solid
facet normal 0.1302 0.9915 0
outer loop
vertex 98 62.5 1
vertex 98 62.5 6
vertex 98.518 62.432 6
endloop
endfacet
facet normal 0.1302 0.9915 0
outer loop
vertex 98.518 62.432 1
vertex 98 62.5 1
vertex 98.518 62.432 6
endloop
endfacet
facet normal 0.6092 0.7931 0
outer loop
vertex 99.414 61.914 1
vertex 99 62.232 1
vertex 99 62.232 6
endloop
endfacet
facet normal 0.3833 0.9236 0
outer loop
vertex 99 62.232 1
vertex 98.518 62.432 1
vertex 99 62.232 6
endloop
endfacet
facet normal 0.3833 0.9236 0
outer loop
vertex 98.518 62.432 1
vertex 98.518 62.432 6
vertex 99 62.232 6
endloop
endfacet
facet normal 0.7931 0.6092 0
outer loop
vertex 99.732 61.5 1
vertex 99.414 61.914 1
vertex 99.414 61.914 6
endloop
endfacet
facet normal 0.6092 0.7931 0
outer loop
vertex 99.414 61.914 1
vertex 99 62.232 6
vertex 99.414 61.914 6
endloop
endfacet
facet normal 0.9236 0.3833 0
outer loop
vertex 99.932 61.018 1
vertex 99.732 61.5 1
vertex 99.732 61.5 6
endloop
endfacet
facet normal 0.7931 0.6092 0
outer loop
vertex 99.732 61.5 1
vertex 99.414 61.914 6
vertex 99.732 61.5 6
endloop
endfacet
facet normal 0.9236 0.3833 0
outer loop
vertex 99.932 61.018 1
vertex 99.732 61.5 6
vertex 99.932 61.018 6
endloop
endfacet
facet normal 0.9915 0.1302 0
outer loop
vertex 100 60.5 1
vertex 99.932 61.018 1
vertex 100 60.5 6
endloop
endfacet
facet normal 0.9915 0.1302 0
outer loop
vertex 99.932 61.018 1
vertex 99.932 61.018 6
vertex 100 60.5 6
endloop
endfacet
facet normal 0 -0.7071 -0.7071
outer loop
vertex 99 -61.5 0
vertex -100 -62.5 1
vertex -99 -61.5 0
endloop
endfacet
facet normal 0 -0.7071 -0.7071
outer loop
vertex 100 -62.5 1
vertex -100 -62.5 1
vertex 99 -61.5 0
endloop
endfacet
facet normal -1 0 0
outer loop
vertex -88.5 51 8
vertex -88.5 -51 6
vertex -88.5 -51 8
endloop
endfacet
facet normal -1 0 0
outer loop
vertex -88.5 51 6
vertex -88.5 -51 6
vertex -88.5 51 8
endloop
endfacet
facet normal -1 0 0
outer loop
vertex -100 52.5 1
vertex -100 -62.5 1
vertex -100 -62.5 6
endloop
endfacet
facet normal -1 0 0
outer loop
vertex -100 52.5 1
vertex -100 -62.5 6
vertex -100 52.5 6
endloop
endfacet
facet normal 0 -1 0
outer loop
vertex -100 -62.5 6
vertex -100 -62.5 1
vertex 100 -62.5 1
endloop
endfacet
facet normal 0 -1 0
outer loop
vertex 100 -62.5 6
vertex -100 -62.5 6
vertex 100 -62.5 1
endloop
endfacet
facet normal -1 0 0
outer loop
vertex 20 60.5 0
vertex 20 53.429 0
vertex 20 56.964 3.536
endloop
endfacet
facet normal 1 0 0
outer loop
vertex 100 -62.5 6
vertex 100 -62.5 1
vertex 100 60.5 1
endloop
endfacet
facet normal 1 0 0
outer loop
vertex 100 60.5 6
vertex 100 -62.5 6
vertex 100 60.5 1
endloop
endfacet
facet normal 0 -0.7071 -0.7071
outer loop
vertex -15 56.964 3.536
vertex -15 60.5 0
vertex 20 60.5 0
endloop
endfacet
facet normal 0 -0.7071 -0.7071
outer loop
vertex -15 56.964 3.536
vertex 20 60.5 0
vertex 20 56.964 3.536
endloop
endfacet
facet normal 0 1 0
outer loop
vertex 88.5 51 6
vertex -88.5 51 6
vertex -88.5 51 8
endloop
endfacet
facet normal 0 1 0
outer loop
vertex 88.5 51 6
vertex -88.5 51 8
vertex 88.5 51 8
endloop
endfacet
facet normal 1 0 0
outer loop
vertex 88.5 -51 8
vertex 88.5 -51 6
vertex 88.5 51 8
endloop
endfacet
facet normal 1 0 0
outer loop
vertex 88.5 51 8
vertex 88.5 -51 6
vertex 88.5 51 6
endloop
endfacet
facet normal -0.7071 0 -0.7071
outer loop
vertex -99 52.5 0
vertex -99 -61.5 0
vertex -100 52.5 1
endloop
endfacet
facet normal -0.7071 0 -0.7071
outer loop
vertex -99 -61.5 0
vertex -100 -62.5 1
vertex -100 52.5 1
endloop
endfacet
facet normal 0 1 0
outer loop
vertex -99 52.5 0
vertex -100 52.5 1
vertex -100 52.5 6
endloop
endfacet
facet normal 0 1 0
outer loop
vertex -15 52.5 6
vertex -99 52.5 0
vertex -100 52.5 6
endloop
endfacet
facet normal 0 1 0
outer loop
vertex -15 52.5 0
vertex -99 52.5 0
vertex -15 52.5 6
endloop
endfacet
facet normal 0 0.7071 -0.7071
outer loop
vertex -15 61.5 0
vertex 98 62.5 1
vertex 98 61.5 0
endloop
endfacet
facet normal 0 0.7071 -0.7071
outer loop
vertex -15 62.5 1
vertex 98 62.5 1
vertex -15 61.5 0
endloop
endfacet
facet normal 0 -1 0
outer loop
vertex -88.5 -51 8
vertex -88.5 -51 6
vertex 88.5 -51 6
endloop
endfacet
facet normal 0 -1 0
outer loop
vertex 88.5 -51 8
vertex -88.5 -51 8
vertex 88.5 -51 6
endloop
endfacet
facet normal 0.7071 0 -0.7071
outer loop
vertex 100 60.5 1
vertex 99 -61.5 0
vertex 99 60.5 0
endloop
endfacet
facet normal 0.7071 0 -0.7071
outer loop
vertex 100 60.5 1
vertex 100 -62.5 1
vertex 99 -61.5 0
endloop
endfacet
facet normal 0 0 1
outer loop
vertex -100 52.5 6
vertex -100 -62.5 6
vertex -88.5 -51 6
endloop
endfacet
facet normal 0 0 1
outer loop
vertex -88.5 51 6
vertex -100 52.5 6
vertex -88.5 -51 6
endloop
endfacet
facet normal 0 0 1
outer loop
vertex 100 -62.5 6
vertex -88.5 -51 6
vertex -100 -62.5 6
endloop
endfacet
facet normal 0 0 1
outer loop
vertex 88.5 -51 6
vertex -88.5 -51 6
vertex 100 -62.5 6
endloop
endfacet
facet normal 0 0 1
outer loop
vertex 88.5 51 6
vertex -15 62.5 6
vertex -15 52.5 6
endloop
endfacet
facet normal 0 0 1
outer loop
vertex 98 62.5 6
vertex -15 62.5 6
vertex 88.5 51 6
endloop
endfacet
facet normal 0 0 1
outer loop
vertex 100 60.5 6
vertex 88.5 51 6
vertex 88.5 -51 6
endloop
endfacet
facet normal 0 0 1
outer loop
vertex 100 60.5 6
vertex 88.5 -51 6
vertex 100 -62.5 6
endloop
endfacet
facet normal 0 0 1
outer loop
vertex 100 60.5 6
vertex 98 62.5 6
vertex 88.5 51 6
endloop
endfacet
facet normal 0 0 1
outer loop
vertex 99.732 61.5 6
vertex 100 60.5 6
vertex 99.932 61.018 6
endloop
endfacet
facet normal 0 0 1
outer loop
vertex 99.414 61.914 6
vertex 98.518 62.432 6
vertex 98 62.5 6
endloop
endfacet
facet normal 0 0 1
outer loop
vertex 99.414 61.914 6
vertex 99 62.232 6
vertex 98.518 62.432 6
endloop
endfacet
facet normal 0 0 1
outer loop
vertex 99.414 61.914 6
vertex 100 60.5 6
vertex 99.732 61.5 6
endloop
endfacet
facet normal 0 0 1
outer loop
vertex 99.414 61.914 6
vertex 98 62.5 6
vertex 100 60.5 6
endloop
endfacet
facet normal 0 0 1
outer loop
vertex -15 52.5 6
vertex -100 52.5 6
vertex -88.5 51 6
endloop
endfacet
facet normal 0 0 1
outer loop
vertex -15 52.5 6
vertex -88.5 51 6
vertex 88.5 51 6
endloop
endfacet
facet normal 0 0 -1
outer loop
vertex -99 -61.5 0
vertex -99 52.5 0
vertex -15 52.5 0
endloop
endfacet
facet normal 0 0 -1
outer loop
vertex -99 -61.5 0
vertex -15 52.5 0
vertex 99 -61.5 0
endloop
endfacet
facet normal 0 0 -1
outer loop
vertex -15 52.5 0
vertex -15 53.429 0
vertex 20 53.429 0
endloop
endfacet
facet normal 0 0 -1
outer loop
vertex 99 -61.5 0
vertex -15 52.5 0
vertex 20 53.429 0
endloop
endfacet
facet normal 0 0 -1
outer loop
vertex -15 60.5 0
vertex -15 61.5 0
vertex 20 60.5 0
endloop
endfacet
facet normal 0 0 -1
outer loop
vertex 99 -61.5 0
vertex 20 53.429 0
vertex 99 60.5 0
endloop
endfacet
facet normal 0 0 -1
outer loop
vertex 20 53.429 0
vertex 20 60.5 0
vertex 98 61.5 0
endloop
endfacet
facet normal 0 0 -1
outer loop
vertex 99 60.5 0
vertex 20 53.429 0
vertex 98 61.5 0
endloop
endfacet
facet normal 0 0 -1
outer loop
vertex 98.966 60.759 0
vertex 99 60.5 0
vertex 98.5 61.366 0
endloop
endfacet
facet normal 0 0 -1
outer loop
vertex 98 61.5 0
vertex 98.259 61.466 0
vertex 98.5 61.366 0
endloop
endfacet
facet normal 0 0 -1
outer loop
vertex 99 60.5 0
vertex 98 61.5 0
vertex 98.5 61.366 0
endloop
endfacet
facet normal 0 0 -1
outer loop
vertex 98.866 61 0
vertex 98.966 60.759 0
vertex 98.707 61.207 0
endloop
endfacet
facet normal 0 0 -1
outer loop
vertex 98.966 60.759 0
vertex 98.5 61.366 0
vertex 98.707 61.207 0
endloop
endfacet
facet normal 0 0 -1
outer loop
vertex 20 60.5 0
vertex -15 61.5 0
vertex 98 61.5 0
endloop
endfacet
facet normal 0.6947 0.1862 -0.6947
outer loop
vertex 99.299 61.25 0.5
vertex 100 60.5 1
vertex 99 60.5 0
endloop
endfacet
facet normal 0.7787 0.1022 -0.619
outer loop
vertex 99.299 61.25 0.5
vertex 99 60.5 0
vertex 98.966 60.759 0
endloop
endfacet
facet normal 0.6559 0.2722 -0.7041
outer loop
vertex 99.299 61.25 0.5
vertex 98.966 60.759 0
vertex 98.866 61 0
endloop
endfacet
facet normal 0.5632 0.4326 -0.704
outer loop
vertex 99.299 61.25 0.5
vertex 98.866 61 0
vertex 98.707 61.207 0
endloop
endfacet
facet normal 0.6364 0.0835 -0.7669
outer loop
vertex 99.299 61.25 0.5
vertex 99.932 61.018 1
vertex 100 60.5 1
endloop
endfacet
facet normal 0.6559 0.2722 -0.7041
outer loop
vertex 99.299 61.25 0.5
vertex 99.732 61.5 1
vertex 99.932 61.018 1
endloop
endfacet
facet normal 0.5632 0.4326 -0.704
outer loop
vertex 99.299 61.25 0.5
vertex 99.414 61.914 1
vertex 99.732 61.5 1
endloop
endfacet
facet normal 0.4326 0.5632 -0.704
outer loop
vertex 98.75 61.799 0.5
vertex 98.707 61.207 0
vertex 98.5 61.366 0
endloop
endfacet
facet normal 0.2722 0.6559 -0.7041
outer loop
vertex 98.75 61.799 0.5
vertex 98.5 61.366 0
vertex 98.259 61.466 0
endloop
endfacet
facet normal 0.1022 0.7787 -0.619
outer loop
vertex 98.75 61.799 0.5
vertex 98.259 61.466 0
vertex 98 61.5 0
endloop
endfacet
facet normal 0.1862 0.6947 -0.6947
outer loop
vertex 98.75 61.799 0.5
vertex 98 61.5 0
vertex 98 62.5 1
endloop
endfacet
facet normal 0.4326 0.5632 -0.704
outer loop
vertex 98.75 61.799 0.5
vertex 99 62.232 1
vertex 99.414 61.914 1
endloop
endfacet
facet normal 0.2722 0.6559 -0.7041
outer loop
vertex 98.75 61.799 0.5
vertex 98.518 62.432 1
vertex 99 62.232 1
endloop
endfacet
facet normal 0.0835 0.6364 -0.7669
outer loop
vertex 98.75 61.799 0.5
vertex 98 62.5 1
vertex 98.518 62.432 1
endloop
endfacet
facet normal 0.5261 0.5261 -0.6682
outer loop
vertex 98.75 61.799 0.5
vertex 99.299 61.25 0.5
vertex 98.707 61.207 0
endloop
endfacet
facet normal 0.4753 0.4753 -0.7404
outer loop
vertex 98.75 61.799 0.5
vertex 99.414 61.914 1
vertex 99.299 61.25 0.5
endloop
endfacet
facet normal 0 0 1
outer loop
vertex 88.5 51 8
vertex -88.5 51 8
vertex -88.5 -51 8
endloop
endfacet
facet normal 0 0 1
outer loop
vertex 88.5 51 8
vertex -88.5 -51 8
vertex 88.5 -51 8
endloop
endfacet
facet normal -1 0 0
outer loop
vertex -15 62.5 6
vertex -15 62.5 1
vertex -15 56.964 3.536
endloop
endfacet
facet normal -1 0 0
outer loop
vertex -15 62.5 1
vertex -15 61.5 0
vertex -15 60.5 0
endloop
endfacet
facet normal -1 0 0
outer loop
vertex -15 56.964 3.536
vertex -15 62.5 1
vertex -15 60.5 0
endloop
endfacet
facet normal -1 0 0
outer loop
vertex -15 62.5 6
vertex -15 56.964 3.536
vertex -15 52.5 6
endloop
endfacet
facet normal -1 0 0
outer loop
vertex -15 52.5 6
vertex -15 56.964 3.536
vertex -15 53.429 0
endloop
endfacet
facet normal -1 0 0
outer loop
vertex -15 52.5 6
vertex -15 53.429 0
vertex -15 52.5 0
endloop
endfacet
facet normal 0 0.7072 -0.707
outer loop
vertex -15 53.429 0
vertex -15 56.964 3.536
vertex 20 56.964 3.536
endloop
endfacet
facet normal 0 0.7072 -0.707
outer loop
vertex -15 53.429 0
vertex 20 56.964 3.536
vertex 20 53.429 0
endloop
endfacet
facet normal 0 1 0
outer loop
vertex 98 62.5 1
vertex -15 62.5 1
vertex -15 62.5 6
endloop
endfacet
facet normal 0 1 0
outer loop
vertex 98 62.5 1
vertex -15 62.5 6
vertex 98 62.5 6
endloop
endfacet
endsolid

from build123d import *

# Parameters (mm, degrees)
SKETCH_W        = 200
SKETCH_H        = 125
PAD_DEPTH       = 6
SKETCH001_W     = 177
SKETCH001_H     = 102
PAD001_DEPTH    = 2
POCKET_DEPTH    = 120
SKETCH003_W     = 85
SKETCH003_H     = 10
POCKET001_DEPTH = 8.001
FILLET_R        = 2
CHAMFER_SIZE    = 1
CHAMFER001_SIZE = 1
CHAMFER002_SIZE = 1


with BuildPart() as part:
    # Sketch → Pad (new body)
    with BuildSketch(Plane.XY):
        Rectangle(SKETCH_W, SKETCH_H)
    extrude(amount=PAD_DEPTH)

    # Sketch001 (on Face6 of Pad) → Pad001 (join)
    with BuildSketch(Plane.XY.offset(6)):
        Rectangle(SKETCH001_W, SKETCH001_H)
    extrude(amount=PAD001_DEPTH)

    # Sketch002 (on Face2 of Pad001) → Pocket (cut)
    with BuildSketch(Plane(origin=(-100, 0, 0), x_dir=(0, -1, 0), z_dir=(-1, 0, 0))):
        Polygon((-60.5, 0), (-56.964466, 3.535534), (-53.428932, 0), (-56.964466, -3.535534), align=None)
    extrude(amount=-POCKET_DEPTH, mode=Mode.SUBTRACT)

    # Sketch003 (on Face4 of Pocket) → Pocket001 (cut, through all)
    with BuildSketch(Plane(origin=(0, 0, 0), x_dir=(1, 0, 0), z_dir=(0, 0, -1))):
        with Locations((-57.5, -57.5)):
            Rectangle(SKETCH003_W, SKETCH003_H)
    extrude(amount=-POCKET001_DEPTH, mode=Mode.SUBTRACT)

    # Fillet
    fillet_edges = [part.edges().sort_by_distance(p)[0] for p in [
        (100, 62.5, 3),
    ]]
    fillet(fillet_edges, radius=FILLET_R)

    # Chamfer
    chamfer_edges = [part.edges().sort_by_distance(p)[0] for p in [
        (100, -1, 0),
    ]]
    chamfer(chamfer_edges, length=CHAMFER_SIZE)

    # Chamfer001
    chamfer001_edges = [part.edges().sort_by_distance(p)[0] for p in [
        (-100, -5, 0),
    ]]
    chamfer(chamfer001_edges, length=CHAMFER001_SIZE)

    # Chamfer002
    chamfer002_edges = [part.edges().sort_by_distance(p)[0] for p in [
        (0, -62.5, 0),
    ]]
    chamfer(chamfer002_edges, length=CHAMFER002_SIZE)


solid = part.part
